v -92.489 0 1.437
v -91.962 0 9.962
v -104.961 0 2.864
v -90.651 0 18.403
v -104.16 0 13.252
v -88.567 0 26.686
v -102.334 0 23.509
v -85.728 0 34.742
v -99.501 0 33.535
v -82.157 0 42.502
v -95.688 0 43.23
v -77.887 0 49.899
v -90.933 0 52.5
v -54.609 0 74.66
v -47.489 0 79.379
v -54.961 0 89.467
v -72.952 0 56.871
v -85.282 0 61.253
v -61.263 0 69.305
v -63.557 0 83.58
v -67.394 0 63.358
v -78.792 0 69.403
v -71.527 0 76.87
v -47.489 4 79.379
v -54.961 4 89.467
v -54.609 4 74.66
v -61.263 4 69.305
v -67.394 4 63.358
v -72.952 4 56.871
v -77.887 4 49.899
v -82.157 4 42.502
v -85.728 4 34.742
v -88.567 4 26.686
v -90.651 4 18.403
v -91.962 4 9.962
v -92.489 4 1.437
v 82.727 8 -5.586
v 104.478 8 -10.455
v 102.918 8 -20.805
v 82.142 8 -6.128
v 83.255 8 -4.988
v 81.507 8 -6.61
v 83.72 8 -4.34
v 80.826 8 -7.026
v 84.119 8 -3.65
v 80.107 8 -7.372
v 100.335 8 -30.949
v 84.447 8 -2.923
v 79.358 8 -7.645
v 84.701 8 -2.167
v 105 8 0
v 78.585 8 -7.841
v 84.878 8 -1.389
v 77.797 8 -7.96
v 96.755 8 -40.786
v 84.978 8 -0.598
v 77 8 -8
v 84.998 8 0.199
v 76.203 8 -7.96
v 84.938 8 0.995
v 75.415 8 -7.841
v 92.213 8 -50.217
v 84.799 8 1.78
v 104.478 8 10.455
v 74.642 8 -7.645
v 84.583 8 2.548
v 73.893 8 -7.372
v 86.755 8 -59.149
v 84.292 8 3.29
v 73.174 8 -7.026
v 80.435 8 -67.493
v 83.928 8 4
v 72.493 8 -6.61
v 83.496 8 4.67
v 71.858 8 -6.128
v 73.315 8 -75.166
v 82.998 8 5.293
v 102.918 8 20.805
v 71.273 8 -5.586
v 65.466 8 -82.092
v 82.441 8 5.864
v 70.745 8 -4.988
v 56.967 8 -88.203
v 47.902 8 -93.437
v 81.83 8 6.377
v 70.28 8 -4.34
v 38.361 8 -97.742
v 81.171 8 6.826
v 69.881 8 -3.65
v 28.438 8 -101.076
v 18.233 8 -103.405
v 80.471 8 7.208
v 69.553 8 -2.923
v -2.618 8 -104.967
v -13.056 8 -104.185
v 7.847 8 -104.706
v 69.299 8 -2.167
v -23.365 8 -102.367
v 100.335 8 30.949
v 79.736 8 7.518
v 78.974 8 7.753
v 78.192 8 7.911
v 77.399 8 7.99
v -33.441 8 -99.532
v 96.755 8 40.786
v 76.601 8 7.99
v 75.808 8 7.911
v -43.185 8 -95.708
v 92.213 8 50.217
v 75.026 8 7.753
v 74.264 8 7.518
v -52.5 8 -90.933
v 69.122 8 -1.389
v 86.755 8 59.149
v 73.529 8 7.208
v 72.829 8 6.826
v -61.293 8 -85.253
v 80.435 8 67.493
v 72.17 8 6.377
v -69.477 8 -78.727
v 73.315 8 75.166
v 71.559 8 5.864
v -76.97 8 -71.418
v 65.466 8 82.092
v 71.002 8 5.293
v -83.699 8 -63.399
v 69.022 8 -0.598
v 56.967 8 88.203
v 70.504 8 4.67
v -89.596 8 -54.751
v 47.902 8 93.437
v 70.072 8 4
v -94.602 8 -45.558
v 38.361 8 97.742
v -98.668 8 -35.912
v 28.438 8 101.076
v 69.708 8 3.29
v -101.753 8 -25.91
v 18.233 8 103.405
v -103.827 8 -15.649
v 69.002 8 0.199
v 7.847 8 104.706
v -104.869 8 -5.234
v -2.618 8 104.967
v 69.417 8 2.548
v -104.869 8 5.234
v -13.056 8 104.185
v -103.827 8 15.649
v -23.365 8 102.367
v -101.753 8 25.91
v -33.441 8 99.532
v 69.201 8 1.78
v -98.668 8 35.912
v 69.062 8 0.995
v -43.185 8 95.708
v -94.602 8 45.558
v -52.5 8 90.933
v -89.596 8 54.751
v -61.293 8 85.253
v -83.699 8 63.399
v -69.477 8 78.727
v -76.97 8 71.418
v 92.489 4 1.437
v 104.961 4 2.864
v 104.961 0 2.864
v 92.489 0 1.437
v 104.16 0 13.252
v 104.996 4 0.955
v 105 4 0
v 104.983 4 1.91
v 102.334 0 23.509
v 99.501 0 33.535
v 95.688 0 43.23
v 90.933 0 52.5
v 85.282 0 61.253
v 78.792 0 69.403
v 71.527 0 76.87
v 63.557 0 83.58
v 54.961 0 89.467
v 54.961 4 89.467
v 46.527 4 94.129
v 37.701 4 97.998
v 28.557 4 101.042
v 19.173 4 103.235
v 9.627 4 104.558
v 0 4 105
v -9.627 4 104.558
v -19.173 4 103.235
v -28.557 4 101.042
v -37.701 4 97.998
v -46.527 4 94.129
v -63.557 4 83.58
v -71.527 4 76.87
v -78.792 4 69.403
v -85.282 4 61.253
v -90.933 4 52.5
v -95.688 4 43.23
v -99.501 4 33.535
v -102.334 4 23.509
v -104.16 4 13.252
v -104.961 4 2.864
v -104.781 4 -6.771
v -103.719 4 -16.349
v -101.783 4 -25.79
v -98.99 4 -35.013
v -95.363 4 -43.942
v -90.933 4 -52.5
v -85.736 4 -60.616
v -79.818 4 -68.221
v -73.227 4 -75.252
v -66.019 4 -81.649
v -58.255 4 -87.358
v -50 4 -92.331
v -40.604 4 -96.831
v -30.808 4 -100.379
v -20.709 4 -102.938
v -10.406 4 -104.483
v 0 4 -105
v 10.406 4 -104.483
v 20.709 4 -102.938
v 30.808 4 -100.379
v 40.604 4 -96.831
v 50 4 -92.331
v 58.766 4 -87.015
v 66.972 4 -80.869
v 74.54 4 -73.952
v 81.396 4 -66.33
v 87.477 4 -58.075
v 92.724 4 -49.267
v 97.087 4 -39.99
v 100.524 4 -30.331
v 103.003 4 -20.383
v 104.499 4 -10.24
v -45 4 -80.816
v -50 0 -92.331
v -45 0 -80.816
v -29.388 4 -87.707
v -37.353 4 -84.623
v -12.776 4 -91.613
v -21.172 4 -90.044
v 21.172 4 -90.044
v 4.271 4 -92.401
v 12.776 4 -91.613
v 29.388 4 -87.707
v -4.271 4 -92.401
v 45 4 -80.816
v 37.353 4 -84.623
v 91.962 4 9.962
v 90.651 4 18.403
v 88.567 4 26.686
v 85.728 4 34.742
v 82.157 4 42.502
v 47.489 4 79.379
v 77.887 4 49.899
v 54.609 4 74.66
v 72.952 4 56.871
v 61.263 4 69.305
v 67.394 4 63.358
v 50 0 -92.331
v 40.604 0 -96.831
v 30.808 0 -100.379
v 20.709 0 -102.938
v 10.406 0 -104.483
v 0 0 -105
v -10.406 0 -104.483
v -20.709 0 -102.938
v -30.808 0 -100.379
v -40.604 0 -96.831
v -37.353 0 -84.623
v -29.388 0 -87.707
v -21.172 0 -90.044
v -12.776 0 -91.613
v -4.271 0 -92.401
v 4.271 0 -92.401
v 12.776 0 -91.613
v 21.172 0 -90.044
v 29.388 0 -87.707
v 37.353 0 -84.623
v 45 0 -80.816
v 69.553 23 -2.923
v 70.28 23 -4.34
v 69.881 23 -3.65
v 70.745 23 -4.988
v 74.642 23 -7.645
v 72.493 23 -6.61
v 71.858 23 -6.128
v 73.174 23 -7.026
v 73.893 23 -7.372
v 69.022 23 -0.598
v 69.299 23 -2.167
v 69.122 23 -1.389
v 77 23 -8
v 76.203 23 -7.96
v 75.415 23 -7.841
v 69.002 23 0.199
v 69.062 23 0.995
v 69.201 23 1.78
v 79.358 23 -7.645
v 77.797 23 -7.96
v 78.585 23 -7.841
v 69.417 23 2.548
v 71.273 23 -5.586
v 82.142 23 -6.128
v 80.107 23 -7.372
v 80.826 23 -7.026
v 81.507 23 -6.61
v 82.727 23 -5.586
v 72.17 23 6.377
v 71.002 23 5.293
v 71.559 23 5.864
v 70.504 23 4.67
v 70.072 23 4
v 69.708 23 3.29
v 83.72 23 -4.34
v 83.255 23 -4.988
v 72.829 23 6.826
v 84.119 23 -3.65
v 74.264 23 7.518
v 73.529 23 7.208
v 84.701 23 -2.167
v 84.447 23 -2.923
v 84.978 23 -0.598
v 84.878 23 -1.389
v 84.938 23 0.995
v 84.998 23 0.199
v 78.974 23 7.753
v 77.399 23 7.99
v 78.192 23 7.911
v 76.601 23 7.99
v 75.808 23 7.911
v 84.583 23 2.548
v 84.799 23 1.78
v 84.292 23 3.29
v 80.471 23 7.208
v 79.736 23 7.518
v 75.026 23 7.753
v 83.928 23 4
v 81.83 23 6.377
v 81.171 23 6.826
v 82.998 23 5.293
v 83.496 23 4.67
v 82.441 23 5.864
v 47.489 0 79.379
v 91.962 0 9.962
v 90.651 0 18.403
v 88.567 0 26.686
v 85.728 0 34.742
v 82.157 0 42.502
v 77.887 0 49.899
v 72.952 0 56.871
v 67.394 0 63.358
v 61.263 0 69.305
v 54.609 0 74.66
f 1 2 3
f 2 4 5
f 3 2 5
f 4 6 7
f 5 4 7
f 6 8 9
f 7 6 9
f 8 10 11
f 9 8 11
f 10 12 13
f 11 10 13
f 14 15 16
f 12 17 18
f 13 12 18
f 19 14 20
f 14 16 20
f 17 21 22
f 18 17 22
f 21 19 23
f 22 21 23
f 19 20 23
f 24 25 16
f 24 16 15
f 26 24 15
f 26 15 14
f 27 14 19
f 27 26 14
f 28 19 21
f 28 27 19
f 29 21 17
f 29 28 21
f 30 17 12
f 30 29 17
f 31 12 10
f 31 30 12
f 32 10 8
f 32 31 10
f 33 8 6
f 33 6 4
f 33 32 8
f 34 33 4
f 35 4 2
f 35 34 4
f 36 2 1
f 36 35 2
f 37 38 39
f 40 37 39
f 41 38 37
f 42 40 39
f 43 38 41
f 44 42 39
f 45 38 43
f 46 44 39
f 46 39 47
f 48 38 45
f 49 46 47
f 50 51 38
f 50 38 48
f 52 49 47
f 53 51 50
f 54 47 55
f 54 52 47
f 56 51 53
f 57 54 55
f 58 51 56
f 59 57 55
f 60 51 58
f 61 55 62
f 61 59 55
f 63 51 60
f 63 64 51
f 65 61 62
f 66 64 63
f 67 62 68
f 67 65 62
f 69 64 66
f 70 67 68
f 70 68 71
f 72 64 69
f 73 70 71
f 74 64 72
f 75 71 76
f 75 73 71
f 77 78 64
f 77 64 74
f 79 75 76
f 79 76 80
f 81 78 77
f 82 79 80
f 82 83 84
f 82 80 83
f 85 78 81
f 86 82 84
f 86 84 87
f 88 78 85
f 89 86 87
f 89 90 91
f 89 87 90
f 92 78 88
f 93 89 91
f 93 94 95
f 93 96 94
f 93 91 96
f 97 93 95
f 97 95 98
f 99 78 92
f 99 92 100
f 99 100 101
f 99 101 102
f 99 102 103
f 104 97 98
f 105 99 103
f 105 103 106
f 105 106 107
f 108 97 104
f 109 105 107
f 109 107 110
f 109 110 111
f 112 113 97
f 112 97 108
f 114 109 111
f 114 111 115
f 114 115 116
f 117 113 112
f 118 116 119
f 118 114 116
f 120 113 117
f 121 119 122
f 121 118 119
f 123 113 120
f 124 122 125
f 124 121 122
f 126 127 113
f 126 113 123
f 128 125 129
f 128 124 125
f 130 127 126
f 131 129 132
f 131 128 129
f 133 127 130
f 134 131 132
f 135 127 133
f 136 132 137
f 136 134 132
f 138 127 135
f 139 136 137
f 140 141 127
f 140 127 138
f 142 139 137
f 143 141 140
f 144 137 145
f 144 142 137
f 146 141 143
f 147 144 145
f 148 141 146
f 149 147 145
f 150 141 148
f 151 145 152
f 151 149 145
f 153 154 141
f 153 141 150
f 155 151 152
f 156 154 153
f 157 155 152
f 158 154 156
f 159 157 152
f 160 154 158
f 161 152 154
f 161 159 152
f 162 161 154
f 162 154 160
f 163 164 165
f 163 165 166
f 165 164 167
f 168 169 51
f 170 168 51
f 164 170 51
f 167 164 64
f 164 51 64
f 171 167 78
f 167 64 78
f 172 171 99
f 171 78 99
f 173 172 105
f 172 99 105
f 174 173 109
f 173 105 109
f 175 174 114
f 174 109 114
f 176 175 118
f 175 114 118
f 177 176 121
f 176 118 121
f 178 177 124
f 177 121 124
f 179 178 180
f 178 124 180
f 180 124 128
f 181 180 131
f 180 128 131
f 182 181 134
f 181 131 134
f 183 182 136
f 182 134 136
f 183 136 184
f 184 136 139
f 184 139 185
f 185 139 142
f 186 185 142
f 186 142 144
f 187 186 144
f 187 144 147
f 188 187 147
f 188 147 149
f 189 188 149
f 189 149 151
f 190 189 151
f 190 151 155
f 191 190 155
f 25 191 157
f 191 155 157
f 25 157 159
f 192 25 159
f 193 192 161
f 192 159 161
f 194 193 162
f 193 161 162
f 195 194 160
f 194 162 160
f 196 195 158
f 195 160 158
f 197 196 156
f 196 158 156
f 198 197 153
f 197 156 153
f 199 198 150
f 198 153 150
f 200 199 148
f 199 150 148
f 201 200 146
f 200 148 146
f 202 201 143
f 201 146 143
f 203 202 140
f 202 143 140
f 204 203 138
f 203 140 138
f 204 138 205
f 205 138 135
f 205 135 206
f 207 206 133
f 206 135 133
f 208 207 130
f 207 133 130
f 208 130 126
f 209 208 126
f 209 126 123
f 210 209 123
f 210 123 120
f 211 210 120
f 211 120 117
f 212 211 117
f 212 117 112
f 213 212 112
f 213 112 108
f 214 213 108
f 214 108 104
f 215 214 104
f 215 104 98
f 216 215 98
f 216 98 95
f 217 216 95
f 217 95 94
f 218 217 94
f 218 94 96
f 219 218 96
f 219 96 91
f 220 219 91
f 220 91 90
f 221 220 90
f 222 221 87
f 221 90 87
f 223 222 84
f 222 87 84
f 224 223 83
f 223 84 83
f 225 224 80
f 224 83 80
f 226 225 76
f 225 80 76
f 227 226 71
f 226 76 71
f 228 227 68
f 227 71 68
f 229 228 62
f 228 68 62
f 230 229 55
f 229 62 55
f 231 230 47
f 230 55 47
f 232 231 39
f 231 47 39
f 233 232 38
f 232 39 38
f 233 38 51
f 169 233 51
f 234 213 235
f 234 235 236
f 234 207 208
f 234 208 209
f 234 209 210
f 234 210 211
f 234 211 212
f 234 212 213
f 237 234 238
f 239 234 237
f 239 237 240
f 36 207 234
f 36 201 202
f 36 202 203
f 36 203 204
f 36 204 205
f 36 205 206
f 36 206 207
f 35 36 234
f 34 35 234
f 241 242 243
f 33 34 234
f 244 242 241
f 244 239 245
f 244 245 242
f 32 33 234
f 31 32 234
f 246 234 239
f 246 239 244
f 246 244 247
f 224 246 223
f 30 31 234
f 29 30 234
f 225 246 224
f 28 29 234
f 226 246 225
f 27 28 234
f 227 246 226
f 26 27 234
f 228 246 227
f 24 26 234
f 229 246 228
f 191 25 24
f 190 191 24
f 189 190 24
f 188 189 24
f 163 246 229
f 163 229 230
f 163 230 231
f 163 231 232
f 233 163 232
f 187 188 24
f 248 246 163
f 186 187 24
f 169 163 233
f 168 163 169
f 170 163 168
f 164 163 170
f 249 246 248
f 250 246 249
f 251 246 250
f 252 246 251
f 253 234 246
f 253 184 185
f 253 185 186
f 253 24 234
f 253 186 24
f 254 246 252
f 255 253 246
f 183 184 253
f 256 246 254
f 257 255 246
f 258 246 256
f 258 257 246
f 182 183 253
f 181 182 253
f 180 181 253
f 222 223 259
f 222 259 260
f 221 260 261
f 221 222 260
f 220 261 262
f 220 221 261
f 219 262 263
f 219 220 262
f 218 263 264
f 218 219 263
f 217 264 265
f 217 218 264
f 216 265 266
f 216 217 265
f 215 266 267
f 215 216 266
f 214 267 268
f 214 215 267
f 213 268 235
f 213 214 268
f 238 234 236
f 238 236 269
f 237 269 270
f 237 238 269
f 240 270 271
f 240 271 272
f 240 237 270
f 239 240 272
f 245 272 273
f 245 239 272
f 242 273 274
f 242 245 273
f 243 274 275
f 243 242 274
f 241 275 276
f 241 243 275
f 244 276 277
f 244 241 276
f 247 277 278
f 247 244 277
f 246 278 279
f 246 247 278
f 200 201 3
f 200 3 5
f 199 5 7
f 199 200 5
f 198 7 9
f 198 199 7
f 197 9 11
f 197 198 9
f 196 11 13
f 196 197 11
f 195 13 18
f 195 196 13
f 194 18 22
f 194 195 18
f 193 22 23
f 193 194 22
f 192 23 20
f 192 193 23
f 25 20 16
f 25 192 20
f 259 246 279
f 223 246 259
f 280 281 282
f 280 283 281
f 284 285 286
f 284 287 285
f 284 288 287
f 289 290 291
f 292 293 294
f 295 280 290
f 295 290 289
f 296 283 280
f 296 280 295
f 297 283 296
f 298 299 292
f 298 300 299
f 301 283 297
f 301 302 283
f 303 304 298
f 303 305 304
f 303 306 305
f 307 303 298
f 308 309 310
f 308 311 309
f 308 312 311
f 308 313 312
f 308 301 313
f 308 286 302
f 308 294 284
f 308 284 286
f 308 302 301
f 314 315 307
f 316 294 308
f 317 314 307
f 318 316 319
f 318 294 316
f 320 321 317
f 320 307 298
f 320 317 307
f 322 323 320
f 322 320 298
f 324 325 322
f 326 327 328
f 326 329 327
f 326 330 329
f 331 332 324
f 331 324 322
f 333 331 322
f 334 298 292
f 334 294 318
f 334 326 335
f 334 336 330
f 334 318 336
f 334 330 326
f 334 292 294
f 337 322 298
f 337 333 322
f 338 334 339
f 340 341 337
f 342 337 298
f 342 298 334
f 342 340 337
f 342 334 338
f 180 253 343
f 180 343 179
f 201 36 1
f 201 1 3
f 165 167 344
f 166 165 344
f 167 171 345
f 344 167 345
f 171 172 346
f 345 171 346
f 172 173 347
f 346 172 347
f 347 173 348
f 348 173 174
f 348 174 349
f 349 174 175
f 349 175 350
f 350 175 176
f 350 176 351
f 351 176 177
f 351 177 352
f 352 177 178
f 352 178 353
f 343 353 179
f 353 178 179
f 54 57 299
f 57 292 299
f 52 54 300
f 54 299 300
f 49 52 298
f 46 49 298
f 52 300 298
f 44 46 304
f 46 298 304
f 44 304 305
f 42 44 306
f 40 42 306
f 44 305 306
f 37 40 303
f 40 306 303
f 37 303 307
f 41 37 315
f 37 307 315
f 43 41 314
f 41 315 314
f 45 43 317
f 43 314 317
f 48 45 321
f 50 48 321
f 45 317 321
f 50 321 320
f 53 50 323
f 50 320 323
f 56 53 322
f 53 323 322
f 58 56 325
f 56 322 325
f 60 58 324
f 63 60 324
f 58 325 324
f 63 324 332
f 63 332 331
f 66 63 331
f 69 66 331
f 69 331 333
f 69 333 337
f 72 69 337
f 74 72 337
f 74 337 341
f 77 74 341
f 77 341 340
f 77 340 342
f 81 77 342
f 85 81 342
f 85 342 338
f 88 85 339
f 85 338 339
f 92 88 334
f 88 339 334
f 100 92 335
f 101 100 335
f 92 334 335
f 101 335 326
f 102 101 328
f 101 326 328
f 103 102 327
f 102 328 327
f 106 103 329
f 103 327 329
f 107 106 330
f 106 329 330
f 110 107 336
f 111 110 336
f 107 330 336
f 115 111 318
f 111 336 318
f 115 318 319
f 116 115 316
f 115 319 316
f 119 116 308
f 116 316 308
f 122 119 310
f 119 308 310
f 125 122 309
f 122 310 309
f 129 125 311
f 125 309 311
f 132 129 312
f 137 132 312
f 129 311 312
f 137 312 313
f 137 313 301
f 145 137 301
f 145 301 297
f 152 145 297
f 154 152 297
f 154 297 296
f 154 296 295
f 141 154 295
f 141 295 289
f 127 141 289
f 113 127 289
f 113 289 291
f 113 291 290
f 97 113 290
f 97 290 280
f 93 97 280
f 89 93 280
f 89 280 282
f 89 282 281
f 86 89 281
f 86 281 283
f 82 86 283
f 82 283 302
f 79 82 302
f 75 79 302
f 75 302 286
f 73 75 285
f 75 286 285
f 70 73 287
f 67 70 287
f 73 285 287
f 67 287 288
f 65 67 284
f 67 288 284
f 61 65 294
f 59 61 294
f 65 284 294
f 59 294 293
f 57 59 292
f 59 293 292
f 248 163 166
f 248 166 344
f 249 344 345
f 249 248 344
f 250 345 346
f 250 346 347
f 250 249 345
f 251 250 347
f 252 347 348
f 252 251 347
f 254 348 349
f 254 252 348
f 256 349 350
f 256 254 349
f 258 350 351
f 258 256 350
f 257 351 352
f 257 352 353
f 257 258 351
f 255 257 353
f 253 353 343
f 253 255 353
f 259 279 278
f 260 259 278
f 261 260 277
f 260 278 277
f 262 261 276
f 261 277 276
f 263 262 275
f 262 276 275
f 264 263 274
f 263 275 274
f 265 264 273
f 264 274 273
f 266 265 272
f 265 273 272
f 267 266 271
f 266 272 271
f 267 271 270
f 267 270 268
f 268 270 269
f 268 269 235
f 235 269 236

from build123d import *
from build123d.topology import SkipClean

# Parameters (mm, degrees)
SKETCH1_W           = 105
SKETCH1_H           = 8
CUT_EXTRUDE1_START  = -4
CUT_EXTRUDE1_DEPTH  = 4
BOSS_EXTRUDE1_DEPTH = 4
BOSS_EXTRUDE2_DEPTH = 4
SKETCH5_W           = 8
SKETCH5_H           = 15


with BuildPart() as part:
    # Sketch1 → Revolve1 (revolve)
    with BuildSketch(Plane.XY):
        with Locations((52.5, 4)):
            Rectangle(SKETCH1_W, SKETCH1_H)
    revolve(axis=Axis((0, 8, 0), (0, -1, 0)))

    # Sketch2 → Cut-Extrude1 (cut)
    with BuildSketch(Plane.XZ.offset(CUT_EXTRUDE1_START)):
        with BuildLine():
            Line((47.488838396, 79.379217858), (54.960927959, 89.466733471))
            ThreePointArc((54.960927959, 89.466733471), (-90.932667397, -52.5), (104.960927959, 2.864193092))
            Line((104.960927959, 2.864193092), (92.488838396, 1.436931518))
            ThreePointArc((92.488838396, 1.436931518), (80.10734985, 46.25), (47.488838396, 79.379217858))
        make_face()
    extrude(amount=CUT_EXTRUDE1_DEPTH, mode=Mode.SUBTRACT)

    # Sketch3 → Boss-Extrude1 (add)
    with SkipClean():  # the faces are left unmerged after this step: merging them gives an invalid solid
        with BuildSketch(Plane.XZ.offset(-4)):
            with BuildLine():
                Line((-92.488838396, 1.436931518), (-104.960927959, 2.864193092))
                ThreePointArc((-104.960927959, 2.864193092), (-90.932667397, 52.5), (-54.960927959, 89.466733471))
                Line((-54.960927959, 89.466733471), (-47.488838396, 79.379217858))
                ThreePointArc((-47.488838396, 79.379217858), (-80.10734985, 46.25), (-92.488838396, 1.436931518))
            make_face()
        extrude(amount=BOSS_EXTRUDE1_DEPTH)

    # Sketch4 → Boss-Extrude2 (add)
    with SkipClean():  # the faces are left unmerged after this step: merging them gives an invalid solid
        with BuildSketch(Plane.XZ.offset(-4)):
            with BuildLine():
                Line((-50, -92.330926563), (-45, -80.816149376))
                ThreePointArc((-45, -80.816149376), (0, -92.5), (45, -80.816149376))
                Line((45, -80.816149376), (50, -92.330926563))
                ThreePointArc((50, -92.330926563), (0, -105), (-50, -92.330926563))
            make_face()
        extrude(amount=BOSS_EXTRUDE2_DEPTH)

    # Sketch5 → Revolve2 (revolve)
    with SkipClean():  # the faces are left unmerged after this step: merging them gives an invalid solid
        with BuildSketch(Plane.XY, mode=Mode.PRIVATE) as revolve2_sk:
            with Locations((81, 15.5)):
                Rectangle(SKETCH5_W, SKETCH5_H)
        revolve(revolve2_sk.sketch.rotate(Axis((77, 23, 0), (0, -1, 0)), 270), axis=Axis((77, 23, 0), (0, -1, 0)))


solid = part.part
